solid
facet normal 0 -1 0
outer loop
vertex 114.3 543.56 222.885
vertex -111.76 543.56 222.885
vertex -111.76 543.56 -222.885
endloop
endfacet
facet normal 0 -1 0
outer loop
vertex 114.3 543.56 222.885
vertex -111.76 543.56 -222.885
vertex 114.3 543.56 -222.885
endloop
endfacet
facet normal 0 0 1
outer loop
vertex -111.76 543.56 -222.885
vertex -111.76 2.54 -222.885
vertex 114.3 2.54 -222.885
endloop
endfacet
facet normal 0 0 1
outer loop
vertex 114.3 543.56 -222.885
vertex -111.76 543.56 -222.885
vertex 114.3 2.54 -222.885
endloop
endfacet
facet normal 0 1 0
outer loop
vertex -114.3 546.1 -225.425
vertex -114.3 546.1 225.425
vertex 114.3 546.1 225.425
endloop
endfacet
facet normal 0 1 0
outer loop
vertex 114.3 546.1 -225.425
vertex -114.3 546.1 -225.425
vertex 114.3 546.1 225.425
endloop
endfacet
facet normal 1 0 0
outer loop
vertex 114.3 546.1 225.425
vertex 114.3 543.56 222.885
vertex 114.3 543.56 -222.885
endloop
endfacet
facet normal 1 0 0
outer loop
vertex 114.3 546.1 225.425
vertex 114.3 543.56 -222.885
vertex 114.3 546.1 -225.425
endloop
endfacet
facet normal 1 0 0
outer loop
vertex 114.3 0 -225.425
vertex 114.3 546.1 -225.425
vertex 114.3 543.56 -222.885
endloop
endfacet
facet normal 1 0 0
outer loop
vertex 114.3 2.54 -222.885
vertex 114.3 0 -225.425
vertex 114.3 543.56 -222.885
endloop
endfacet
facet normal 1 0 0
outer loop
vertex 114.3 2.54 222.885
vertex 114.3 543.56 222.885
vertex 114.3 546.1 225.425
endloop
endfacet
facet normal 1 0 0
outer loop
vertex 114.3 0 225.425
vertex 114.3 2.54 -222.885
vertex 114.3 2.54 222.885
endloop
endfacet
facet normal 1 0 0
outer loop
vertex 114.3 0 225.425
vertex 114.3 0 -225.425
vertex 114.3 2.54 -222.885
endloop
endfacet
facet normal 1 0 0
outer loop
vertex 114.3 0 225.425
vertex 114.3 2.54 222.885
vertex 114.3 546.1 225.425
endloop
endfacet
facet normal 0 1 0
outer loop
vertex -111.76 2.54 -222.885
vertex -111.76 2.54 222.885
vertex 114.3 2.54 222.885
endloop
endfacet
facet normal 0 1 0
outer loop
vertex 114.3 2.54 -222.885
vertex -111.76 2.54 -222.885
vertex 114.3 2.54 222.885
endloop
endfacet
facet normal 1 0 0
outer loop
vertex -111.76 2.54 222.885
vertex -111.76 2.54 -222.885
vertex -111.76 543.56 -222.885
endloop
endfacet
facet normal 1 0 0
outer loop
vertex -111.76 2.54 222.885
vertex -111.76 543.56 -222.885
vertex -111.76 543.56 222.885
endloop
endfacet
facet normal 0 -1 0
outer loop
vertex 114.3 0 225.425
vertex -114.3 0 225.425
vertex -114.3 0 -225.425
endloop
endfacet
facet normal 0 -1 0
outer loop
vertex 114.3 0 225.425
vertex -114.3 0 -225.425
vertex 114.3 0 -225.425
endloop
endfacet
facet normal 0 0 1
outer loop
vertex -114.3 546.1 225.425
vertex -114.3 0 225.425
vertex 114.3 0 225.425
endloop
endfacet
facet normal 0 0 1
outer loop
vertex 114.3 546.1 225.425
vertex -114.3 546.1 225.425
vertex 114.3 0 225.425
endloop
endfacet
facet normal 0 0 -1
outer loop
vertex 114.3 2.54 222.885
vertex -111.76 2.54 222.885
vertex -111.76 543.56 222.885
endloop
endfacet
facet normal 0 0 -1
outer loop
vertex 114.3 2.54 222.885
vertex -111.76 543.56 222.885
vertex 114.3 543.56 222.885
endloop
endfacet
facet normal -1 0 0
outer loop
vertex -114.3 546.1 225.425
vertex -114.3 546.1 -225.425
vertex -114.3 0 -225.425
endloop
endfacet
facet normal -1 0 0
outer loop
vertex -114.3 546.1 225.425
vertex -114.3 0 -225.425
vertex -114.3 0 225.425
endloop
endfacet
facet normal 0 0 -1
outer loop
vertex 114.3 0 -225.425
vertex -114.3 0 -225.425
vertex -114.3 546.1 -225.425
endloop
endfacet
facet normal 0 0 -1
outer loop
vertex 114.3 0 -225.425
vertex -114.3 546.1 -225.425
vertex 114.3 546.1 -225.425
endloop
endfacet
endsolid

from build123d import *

# Parameters (mm, degrees)
F0_W     = 228.6
F0_H     = 450.85
F1_DEPTH = 546.1
F2_T     = -2.54


with BuildPart() as f1:
    # F0 (on Front) → F1 (new body)
    with BuildSketch(Plane.XZ):
        Rectangle(F0_W, F0_H)
    extrude(amount=-F1_DEPTH)

    # F2
    f2_openings = [f1.faces().sort_by_distance(p)[0] for p in [
        (114.3, 273.05, 0),
    ]]
    offset(amount=F2_T, openings=f2_openings)


solid = f1.part
